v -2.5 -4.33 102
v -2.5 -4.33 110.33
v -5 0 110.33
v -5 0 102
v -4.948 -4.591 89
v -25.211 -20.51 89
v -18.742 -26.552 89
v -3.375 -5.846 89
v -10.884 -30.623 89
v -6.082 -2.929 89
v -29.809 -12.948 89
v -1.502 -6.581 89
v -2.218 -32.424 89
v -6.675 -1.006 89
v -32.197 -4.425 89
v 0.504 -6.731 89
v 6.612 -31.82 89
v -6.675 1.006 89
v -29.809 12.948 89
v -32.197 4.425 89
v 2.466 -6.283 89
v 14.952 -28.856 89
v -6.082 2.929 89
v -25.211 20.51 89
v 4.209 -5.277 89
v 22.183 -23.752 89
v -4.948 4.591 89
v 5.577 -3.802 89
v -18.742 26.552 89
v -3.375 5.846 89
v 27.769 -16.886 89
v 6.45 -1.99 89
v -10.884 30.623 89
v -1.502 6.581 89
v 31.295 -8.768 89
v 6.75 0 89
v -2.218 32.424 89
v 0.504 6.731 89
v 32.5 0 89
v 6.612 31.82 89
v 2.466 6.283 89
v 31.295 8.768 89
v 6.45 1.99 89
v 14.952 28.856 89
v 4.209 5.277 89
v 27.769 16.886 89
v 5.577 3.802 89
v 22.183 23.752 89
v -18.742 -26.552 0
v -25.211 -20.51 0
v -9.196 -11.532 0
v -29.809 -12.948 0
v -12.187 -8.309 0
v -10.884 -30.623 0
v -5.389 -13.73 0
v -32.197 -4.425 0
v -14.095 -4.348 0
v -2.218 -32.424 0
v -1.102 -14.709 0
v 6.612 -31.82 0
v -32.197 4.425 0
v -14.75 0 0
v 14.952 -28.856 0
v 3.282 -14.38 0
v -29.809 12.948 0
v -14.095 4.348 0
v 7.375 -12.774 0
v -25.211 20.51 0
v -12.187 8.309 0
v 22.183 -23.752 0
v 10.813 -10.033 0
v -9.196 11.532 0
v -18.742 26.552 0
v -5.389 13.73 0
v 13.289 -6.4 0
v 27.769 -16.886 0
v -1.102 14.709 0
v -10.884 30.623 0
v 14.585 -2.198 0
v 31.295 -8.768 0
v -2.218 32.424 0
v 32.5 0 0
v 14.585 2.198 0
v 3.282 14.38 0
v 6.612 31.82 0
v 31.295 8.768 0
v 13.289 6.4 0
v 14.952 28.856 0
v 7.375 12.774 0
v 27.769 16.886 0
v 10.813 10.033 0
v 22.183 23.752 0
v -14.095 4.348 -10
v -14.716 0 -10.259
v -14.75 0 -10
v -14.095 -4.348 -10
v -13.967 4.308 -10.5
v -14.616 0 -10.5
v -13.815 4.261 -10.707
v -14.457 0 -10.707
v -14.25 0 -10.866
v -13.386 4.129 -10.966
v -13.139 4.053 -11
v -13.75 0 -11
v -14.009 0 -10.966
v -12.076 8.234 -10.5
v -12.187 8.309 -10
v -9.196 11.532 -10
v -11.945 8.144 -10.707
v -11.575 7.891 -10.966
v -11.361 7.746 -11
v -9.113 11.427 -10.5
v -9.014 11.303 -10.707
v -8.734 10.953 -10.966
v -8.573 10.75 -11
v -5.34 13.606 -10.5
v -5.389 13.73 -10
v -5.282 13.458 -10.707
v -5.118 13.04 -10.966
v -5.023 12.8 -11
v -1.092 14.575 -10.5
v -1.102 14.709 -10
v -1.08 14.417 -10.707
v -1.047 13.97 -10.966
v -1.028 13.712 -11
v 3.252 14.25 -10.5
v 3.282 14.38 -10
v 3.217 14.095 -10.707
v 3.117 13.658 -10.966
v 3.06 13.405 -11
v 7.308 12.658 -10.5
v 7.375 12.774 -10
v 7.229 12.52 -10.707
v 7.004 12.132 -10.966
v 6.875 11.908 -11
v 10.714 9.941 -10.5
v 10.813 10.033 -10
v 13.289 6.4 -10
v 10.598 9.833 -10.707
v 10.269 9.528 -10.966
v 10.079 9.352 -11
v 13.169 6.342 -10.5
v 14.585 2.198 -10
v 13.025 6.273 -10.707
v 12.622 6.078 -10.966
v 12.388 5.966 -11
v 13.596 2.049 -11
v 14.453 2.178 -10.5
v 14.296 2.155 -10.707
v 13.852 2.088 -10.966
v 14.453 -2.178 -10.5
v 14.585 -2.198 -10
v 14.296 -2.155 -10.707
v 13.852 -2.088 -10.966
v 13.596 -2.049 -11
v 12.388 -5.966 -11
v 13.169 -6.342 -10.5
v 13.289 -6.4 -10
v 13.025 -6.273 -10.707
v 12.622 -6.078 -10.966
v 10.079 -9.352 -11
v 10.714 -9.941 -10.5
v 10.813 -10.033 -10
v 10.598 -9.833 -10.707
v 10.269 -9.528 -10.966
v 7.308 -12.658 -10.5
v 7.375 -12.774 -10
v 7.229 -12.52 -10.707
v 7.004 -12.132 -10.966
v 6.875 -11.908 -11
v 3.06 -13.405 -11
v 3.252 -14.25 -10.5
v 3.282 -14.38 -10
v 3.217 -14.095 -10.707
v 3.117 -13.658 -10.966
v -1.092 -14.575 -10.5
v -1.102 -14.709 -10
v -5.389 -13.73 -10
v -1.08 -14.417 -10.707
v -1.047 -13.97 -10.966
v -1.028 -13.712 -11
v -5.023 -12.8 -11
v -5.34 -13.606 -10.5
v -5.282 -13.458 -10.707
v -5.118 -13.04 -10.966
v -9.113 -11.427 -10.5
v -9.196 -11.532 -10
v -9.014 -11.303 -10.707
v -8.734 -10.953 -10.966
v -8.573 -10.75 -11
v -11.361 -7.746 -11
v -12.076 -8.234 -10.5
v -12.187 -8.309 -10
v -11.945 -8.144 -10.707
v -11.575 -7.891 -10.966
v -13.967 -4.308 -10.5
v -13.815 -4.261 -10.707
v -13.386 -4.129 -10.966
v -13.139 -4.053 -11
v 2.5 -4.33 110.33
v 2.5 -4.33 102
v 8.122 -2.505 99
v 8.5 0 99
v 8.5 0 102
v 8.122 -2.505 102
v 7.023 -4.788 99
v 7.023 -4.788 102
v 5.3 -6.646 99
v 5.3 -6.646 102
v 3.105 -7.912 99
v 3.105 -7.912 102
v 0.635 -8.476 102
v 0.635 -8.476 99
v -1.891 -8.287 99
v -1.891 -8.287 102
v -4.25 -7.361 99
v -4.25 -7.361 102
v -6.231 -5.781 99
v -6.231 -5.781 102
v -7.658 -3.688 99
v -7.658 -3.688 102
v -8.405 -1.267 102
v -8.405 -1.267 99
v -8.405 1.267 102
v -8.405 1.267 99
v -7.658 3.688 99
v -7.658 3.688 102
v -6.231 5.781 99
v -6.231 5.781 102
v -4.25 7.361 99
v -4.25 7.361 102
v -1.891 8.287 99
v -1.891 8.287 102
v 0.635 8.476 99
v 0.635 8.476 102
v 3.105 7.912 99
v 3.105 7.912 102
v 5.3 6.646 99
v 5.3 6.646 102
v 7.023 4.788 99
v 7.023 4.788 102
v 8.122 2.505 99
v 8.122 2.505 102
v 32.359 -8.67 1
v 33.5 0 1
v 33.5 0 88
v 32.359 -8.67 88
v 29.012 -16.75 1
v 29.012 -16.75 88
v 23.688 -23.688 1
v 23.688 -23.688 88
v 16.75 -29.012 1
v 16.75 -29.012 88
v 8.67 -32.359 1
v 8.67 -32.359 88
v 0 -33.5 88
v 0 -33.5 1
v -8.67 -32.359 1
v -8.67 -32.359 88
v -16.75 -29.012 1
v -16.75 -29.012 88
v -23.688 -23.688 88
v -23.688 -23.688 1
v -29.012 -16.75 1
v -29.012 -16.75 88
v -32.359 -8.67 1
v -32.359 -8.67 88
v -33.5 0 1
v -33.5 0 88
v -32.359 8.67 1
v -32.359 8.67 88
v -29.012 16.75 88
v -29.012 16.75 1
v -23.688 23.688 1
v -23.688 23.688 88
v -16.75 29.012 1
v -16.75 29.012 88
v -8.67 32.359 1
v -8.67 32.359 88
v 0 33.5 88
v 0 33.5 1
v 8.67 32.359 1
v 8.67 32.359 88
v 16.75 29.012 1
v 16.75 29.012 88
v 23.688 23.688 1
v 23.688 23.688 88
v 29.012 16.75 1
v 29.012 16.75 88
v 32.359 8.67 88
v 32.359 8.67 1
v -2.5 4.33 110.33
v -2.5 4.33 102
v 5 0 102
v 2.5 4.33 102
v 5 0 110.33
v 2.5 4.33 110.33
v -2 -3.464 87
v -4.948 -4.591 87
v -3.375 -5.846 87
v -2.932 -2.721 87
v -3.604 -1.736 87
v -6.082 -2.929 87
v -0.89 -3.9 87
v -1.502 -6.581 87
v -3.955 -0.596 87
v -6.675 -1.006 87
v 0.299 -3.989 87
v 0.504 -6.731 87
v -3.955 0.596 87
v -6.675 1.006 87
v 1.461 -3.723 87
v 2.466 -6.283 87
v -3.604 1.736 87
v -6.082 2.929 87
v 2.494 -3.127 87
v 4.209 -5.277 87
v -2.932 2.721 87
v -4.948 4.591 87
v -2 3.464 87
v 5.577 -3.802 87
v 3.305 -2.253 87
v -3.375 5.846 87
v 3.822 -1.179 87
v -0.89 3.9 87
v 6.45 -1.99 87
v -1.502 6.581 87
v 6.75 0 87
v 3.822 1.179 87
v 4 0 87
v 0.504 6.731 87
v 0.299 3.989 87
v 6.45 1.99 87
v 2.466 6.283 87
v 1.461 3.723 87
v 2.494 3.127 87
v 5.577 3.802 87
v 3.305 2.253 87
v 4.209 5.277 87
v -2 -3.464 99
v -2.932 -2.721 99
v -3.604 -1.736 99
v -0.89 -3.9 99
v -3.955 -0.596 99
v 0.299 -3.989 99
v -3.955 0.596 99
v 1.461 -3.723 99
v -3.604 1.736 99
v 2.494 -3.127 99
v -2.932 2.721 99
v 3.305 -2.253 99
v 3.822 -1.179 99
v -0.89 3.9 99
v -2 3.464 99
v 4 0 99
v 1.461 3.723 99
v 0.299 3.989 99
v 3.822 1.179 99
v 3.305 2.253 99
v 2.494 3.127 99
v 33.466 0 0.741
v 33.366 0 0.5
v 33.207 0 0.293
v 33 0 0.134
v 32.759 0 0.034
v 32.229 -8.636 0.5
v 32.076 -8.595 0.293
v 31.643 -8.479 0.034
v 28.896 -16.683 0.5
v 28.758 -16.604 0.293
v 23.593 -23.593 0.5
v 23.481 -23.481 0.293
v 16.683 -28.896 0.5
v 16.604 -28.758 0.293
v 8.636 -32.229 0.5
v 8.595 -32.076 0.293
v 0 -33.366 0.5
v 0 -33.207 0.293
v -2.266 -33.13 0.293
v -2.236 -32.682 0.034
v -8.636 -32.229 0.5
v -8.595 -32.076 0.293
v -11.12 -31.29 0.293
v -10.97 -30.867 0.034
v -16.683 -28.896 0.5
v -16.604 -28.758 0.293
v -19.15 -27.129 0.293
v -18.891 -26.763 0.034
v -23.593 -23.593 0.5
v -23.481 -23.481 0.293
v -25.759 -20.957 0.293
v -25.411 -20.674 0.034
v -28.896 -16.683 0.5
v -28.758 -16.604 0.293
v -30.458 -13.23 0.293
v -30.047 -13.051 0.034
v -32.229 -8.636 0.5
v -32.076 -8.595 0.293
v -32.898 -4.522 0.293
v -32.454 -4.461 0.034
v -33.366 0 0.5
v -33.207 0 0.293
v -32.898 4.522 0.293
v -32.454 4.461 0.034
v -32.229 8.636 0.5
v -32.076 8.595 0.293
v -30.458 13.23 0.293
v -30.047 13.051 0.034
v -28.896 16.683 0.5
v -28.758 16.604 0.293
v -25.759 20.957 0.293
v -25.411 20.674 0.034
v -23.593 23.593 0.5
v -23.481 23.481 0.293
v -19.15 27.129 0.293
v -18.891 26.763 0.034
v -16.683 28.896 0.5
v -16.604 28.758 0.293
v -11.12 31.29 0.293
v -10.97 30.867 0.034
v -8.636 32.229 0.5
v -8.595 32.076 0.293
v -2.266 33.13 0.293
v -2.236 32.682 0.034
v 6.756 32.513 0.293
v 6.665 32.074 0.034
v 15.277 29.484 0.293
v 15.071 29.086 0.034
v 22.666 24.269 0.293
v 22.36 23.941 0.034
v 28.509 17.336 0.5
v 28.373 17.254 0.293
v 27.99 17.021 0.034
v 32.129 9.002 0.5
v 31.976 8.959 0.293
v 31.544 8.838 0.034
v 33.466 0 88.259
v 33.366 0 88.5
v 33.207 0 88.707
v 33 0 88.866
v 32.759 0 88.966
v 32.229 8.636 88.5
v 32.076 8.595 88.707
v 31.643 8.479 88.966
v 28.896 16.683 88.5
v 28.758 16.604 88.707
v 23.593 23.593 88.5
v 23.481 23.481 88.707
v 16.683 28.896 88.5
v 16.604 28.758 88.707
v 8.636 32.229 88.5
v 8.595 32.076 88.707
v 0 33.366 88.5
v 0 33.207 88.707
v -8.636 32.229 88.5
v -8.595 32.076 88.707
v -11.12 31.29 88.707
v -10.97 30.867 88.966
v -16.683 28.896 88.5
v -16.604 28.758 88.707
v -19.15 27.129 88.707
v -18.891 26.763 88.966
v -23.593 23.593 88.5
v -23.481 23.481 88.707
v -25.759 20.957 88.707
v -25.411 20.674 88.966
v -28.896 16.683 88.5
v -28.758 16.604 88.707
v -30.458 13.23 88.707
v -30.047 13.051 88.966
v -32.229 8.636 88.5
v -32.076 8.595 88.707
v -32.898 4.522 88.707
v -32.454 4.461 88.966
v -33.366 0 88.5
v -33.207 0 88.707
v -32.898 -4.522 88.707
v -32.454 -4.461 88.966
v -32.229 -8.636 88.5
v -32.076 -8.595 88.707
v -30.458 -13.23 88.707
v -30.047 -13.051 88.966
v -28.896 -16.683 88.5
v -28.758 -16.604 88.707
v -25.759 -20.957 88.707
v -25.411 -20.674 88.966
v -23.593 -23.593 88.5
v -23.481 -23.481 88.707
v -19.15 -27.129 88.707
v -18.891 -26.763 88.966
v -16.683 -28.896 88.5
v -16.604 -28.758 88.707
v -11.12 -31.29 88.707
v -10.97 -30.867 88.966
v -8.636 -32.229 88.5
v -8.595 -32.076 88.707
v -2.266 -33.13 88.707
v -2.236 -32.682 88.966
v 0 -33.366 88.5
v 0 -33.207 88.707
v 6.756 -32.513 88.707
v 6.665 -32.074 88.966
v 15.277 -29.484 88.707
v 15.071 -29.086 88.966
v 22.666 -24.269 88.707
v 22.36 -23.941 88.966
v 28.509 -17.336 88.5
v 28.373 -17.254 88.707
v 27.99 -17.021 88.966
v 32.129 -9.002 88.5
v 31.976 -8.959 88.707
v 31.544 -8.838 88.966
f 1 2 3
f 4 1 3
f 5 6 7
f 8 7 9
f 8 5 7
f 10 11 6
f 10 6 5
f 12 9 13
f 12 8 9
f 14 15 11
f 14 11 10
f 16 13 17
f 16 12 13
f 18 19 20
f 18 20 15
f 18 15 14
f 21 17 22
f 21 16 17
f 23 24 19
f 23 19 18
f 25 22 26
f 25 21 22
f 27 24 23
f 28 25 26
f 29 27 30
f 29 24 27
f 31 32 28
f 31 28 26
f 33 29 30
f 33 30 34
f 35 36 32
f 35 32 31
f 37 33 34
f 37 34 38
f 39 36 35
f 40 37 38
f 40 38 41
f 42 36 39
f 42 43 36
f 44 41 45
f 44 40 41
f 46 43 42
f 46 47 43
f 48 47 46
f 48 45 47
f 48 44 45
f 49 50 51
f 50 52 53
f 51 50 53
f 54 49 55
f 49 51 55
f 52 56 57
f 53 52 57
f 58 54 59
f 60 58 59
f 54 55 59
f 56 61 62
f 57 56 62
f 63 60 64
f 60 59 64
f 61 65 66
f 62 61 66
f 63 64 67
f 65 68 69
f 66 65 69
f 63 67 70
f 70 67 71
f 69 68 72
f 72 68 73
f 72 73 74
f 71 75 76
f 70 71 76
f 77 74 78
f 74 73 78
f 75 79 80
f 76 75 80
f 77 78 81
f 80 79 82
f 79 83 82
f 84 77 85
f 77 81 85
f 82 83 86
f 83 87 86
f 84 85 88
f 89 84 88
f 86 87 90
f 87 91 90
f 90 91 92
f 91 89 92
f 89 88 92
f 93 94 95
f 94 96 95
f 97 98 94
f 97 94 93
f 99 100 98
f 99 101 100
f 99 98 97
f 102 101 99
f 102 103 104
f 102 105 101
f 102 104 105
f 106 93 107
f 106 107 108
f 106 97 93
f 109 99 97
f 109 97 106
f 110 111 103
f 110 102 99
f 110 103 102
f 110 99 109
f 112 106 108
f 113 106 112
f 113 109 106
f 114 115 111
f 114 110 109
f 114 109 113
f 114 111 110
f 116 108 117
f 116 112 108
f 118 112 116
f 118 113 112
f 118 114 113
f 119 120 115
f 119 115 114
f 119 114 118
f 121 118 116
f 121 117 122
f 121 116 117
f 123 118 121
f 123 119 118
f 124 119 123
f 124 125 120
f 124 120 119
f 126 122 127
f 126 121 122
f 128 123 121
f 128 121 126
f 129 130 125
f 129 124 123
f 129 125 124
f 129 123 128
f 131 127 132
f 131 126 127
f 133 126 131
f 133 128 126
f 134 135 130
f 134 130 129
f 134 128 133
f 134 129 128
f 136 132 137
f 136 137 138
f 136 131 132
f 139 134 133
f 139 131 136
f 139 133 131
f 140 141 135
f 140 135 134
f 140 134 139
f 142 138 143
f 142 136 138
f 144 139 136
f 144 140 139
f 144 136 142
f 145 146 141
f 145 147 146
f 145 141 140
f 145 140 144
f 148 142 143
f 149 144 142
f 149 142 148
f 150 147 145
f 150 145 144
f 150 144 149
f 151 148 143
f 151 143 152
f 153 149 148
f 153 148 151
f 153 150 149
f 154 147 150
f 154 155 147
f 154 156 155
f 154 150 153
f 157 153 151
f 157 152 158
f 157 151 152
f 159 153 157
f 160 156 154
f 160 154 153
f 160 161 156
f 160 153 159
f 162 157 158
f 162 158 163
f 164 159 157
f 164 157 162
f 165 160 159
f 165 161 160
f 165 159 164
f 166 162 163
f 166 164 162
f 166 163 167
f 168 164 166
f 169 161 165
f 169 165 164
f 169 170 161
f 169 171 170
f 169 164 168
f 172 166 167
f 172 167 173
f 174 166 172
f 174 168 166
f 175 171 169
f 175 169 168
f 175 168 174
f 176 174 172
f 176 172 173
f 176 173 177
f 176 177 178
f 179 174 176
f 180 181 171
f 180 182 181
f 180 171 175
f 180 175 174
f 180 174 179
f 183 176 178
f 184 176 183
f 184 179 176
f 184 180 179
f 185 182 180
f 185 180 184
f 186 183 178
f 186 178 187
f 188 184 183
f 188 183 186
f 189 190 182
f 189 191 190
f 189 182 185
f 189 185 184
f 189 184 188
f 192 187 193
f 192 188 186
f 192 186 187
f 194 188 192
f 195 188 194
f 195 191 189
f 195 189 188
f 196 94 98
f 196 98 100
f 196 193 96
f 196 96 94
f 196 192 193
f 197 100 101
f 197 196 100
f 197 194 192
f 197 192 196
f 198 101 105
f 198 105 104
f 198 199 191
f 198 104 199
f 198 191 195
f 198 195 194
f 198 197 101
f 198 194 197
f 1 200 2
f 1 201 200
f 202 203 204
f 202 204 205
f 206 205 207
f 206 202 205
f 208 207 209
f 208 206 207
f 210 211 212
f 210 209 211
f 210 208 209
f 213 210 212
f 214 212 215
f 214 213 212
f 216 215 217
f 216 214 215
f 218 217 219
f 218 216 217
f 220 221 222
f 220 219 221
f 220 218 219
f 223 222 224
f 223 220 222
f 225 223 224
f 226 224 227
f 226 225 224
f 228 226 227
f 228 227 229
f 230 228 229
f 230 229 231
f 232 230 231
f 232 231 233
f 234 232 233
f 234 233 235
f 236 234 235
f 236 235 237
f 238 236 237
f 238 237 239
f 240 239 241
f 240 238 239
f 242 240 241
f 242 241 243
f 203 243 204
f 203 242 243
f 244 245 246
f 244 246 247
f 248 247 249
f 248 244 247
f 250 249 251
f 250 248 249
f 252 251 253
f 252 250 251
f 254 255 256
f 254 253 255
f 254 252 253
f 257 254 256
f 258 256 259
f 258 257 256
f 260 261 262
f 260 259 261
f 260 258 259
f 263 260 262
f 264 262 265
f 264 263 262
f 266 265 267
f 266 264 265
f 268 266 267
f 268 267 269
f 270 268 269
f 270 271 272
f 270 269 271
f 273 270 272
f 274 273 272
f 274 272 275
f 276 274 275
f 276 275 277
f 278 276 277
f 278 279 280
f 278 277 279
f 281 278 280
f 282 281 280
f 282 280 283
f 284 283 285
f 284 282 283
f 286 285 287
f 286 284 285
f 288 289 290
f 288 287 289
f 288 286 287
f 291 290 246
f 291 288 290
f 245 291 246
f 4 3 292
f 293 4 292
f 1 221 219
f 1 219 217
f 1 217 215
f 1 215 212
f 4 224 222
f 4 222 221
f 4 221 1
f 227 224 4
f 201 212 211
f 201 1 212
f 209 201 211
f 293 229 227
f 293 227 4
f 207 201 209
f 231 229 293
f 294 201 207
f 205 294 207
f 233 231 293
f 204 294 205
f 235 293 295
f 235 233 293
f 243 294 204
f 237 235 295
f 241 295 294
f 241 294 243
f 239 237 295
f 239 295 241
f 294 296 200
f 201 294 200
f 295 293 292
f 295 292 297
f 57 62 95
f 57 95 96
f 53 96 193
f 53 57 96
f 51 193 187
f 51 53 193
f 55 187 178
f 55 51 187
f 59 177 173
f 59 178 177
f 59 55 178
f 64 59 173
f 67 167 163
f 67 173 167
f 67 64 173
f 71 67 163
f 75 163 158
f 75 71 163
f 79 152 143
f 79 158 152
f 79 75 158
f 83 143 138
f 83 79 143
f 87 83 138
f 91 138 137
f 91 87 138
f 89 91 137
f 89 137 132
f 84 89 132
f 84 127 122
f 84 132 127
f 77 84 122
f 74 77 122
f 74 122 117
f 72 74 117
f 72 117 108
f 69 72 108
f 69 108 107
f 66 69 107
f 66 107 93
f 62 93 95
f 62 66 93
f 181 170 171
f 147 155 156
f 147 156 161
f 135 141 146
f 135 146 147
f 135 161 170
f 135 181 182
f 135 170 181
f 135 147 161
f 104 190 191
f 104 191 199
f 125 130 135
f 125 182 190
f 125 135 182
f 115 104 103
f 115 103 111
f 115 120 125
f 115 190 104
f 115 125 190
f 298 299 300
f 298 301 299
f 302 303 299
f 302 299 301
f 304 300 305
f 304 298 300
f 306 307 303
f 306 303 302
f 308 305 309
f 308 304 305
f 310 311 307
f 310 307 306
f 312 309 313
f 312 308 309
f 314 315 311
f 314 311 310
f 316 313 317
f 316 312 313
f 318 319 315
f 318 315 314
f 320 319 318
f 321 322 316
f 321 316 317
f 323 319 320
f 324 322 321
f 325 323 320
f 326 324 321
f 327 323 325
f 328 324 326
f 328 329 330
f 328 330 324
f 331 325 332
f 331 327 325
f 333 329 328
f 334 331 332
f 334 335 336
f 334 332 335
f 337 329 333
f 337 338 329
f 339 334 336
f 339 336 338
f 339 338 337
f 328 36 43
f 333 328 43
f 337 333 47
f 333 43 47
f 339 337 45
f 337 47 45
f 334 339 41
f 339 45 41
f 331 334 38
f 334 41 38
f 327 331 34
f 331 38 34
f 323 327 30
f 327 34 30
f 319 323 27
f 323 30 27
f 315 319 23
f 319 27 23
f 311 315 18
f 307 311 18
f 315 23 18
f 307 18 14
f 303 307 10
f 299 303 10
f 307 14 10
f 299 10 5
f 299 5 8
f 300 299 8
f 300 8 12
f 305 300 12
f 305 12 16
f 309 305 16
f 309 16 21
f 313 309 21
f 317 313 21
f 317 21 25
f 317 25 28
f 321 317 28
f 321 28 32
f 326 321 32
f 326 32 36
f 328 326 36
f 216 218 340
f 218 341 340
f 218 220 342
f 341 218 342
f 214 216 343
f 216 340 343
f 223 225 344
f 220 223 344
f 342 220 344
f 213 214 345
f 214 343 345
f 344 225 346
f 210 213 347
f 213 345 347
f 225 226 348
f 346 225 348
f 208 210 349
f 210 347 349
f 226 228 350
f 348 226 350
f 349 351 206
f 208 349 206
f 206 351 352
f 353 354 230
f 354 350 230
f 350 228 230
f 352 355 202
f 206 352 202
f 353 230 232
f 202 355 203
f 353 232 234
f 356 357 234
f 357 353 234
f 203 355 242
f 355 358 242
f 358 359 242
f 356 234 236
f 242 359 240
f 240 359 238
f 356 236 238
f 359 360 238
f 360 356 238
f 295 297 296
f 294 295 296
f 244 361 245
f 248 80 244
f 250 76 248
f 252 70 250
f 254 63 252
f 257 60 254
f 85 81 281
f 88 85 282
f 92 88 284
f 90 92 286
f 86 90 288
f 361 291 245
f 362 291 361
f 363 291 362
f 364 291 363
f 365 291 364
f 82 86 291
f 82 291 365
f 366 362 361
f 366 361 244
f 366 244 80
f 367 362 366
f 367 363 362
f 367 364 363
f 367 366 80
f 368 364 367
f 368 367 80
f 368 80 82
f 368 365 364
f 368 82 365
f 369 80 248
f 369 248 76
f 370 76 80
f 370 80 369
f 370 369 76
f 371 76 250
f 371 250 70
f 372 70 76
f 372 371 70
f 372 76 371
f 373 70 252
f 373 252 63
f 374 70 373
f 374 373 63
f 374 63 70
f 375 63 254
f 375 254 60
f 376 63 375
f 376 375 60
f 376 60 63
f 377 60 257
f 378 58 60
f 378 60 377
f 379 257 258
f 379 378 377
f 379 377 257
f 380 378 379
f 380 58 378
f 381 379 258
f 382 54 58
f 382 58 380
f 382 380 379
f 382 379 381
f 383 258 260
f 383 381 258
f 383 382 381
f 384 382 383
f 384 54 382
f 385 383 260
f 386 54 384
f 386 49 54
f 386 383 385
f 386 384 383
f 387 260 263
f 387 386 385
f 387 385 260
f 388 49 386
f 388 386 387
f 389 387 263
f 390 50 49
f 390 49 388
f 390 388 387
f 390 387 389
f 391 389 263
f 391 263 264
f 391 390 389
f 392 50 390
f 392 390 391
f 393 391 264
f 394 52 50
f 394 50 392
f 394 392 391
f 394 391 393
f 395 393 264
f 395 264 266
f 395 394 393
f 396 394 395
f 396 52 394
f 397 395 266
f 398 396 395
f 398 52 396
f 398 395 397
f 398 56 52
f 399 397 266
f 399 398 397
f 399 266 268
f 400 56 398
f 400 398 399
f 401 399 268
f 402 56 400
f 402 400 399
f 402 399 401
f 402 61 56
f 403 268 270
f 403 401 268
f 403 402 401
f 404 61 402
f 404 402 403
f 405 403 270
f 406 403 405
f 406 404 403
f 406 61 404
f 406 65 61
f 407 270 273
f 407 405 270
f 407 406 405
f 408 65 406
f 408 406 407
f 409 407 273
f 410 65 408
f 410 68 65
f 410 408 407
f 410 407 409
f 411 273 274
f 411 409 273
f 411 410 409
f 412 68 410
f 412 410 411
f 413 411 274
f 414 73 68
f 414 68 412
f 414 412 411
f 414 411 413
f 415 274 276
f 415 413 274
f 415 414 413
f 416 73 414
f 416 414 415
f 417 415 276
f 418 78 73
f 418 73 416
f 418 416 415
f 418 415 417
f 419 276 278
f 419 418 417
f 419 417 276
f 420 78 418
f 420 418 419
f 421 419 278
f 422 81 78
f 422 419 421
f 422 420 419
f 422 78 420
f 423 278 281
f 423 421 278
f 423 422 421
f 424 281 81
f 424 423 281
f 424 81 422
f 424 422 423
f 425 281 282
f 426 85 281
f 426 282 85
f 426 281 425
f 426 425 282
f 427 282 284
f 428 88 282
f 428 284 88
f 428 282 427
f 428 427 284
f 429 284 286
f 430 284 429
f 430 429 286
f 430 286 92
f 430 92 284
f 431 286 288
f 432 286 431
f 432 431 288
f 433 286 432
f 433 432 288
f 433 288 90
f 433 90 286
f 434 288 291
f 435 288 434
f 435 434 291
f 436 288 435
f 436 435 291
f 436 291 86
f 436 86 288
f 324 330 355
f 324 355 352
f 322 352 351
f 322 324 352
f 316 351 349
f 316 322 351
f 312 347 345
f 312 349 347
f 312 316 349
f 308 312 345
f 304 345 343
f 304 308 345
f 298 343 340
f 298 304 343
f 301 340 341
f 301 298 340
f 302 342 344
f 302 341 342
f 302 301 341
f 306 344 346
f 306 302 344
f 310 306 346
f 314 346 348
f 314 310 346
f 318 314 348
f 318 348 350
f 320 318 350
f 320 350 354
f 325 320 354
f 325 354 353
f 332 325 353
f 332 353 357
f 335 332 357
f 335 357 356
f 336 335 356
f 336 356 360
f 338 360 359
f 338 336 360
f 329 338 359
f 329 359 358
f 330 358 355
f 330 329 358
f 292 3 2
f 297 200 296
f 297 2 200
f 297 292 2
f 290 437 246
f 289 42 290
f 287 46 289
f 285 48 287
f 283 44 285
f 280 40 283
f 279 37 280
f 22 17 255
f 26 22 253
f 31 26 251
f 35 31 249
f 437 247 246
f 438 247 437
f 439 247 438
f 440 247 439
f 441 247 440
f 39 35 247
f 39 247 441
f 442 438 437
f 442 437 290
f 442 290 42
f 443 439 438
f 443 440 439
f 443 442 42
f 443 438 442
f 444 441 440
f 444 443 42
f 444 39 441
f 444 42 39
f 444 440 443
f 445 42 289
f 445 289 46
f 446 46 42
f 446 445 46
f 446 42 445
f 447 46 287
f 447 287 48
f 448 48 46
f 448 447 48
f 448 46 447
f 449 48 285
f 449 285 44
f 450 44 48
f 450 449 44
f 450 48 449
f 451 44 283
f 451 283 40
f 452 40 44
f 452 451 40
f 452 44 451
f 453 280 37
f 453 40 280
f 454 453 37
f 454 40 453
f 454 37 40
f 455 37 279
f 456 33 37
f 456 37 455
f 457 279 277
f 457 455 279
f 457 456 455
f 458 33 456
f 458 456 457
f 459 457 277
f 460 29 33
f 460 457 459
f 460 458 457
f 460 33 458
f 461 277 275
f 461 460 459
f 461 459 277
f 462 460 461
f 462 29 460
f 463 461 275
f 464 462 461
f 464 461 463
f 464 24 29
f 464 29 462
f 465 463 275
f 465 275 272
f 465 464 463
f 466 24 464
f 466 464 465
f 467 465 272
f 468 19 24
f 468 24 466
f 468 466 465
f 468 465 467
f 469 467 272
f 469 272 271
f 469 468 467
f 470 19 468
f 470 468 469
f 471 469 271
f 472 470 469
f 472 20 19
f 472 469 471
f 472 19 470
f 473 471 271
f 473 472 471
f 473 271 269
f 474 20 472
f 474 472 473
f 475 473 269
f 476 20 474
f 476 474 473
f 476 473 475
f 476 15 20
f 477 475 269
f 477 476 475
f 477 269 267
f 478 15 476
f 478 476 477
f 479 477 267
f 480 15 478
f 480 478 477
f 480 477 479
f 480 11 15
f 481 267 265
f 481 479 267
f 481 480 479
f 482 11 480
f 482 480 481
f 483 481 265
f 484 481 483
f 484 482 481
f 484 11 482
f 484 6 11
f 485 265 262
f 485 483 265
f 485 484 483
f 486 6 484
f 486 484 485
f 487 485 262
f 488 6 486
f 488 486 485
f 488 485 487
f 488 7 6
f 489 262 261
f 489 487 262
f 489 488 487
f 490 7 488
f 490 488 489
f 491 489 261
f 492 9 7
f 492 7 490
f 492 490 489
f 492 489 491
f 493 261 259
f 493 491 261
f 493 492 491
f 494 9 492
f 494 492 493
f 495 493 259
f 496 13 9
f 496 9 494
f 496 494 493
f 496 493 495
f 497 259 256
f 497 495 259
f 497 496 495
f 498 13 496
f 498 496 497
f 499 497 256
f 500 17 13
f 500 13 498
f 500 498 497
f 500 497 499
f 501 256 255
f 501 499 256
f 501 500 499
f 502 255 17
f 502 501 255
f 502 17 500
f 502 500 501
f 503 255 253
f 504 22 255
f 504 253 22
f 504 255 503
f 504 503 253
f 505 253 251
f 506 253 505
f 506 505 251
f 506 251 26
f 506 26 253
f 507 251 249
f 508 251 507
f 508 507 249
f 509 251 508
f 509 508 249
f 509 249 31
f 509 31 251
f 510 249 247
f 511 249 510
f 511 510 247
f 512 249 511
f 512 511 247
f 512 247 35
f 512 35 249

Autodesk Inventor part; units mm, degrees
ref_plane "YZ Plane" through (0, 0, 0) normal (1, 0, 0) x (0, 1, 0)
ref_plane "XZ Plane" through (0, 0, 0) normal (0, 1, 0) x (-1, 0, 0)
sketch "Sketch1" plane through (0, 0, 0) normal (0, 0, 1) x (1, 0, 0)
  circle A0 centre (0, 0) radius 33.5
  dimension "d0" = 67
extrude "Extrusion1" add sketch "Sketch1" along normal blind 89
sketch "Sketch2" plane through (0, 0, 0) normal (0, 0, -1) x (-1, 0, 0)
  circle A0 centre (0, 0) radius 14.75
  dimension "d3" = 29.5
extrude "Extrusion2" add sketch "Sketch2" along normal blind 11
fillet "Fillet1" radius 1 3 edges at (14.75, 0, -11) (-33.5, 0, 0) (-33.5, 0, 89)
sketch "Sketch3" plane through (0, 0, 89) normal (0, 0, 1) x (1, 0, 0)
  circle A0 centre (0, 0) radius 33.5 projected
  circle A1 centre (0, 0) radius 6.75
  dimension "d7" = 13.5
extrude "Extrusion3" cut sketch "Sketch3" against normal blind 2 contours A1
sketch "Sketch4" plane through (0, 0, 87) normal (0, 0, 1) x (1, 0, 0)
  circle A0 centre (0, 0) radius 4
  dimension "d10" = 8
ref_plane "Work Plane1" through (0, 0, 99) normal (0, 0, 1) x (1, 0, 0)
extrude "Extrusion4" add sketch "Sketch4" along normal up to surface (12 mm away)
sketch "Sketch5" plane through (0, 0, 99) normal (0, 0, 1) x (1, 0, 0)
  circle A0 centre (0, 0) radius 32.5 construction
  circle A1 centre (0, 0) radius 8.5
  dimension "d14" = 17
extrude "Extrusion5" add sketch "Sketch5" along normal blind 3
sketch "Sketch6" plane through (0, 0, 102) normal (0, 0, 1) x (1, 0, 0)
  circle A0 centre (0, 0) radius 8.5 projected
  line L0 (-2.5, 4.3301) -> (2.5, 4.3301)
  line L1 (2.5, 4.3301) -> (5, 0)
  line L2 (5, 0) -> (2.5, -4.3301)
  line L3 (2.5, -4.3301) -> (-2.5, -4.3301)
  line L4 (-2.5, -4.3301) -> (-5, 0)
  line L5 (-5, 0) -> (-2.5, 4.3301)
  line L6 (-46.9, 0) -> (46.9, 0) construction
  dimension "d17" = 10
extrude "Extrusion6" add sketch "Sketch6" along normal blind 8.33 contours L0 L1 L2 L3 L4 L5
properties part number "MY6812-12VDC-120W"
